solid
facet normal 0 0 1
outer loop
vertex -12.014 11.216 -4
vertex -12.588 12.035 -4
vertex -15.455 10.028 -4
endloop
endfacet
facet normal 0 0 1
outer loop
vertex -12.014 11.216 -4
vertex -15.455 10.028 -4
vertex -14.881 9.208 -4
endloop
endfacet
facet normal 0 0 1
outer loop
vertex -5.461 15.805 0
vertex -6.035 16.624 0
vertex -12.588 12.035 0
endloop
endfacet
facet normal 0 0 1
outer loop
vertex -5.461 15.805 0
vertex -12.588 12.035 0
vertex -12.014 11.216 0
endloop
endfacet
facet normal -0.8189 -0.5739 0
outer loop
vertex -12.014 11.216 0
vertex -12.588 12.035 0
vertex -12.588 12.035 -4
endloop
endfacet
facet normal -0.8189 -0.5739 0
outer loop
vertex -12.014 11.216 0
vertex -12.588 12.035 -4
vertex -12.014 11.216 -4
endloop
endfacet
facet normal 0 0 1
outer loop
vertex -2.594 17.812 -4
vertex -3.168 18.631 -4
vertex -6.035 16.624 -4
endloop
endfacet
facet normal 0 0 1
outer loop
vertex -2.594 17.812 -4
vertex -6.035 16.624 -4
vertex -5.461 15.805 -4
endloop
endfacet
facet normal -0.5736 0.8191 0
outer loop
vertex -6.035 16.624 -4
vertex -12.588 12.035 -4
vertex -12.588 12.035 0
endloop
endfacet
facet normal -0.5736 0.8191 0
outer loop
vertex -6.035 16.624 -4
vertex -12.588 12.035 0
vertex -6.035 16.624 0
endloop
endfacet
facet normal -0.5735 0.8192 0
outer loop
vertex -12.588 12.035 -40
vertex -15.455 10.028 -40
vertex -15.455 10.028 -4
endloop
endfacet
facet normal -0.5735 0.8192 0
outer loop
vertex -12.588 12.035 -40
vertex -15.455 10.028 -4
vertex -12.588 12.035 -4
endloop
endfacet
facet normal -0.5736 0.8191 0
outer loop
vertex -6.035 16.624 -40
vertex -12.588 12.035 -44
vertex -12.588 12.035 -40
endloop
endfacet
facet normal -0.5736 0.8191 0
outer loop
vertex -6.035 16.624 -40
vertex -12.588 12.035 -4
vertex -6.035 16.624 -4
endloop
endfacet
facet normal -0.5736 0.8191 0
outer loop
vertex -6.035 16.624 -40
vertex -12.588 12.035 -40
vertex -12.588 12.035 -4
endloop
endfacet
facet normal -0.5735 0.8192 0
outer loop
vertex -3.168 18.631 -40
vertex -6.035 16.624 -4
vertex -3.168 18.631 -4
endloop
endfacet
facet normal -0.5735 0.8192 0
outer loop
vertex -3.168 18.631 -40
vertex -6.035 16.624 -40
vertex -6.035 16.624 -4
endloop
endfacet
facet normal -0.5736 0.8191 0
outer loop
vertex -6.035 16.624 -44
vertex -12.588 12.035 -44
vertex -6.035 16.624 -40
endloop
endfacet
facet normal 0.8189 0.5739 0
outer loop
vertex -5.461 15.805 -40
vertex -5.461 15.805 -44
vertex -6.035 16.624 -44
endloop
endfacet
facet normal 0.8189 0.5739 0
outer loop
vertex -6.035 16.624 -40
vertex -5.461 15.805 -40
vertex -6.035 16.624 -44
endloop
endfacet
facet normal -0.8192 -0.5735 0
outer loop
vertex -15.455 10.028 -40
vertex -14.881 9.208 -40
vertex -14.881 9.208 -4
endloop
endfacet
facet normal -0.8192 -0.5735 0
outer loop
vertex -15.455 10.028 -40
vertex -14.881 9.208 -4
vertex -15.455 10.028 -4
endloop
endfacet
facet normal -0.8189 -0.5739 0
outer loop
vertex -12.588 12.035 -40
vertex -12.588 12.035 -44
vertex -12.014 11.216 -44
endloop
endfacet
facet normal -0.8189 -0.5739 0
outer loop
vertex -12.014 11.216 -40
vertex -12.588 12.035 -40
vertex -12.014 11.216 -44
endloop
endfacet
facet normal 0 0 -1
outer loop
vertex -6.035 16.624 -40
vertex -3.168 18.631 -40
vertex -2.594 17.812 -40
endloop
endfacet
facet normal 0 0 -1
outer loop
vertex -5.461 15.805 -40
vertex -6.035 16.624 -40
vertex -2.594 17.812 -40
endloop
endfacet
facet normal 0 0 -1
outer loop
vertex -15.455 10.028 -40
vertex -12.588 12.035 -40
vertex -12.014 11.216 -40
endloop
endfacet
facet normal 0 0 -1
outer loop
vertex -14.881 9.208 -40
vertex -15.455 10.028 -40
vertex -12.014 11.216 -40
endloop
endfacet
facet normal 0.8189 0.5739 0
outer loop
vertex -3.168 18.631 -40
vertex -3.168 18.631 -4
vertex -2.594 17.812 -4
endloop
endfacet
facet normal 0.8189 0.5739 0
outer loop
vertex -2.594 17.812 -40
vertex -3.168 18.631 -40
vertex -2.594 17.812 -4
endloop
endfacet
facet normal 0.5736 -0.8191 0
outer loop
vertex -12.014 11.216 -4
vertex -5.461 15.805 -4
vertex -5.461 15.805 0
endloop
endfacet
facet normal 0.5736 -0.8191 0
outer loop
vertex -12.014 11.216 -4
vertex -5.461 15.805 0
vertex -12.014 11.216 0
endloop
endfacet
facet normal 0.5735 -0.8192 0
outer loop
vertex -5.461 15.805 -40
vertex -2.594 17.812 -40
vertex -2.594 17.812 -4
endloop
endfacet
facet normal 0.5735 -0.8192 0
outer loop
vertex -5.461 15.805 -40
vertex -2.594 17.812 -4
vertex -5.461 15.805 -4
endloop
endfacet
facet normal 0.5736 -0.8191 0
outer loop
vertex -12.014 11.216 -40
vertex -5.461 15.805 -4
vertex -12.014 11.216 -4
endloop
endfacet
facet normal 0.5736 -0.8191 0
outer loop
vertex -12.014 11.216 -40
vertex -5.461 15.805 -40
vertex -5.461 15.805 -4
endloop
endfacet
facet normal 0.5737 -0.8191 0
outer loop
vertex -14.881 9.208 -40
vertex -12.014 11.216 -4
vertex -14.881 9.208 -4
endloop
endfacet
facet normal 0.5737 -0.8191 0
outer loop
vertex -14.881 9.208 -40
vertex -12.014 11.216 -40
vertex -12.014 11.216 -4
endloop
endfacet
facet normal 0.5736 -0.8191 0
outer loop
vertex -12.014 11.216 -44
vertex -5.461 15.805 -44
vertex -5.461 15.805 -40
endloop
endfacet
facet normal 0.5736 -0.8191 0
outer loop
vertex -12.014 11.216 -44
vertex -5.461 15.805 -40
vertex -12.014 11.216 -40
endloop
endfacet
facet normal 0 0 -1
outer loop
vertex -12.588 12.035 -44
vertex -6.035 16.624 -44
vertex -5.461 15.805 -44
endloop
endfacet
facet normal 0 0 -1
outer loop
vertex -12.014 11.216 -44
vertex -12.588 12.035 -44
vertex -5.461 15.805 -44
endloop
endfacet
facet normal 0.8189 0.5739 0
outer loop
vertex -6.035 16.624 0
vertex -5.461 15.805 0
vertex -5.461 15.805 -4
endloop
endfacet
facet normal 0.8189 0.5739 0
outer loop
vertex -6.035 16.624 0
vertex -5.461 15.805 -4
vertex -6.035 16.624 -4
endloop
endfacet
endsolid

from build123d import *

# Parameters (mm, degrees)
PAD008_DEPTH               = 22
POCKET008_DEPTH            = 4
BODY004023_PLACEMENT_ANGLE = 90


with BuildPart() as part:
    # Sketch014 → Pad008 (new body)
    with BuildSketch(Plane.XY):
        Polygon((9.2084513411, 14.8813448283), (10.0276033854, 15.4549212646), (18.6312499306, 3.1676406003), (17.8120978864, 2.594064164), align=None)
    pad008 = extrude(amount=-PAD008_DEPTH)

    # Mirrored: Pad008 across face of Pad008
    add(pad008.mirror(Plane(origin=(13.9198506359, 9.0244927143, -22), x_dir=(1, 0, 0), z_dir=(0, 0, -1))))

    # Sketch027 → Pocket008 (cut)
    with BuildSketch(Plane.XY):
        Polygon((9.2084513411, 14.8813448283), (10.0276033854, 15.4549212646), (12.0351209126, 12.5878891096), (11.2159688683, 12.0143126733), align=None)
        Polygon((18.6312499306, 3.1676406003), (17.8120978864, 2.594064164), (15.8045803591, 5.461096319), (16.6237324034, 6.0346727553), align=None)
    pocket008 = extrude(amount=-POCKET008_DEPTH, mode=Mode.SUBTRACT)

    # Mirrored001: Pocket008 across face of Pad008
    add(pocket008.mirror(Plane(origin=(13.9198506359, 9.0244927143, -22), x_dir=(1, 0, 0), z_dir=(0, 0, -1))), mode=Mode.SUBTRACT)


with BuildPart() as part_1:
    # Body004023 placement: moved
    add(part.part.rotate(Axis((0, 0, 0), (0, 0, 1)), BODY004023_PLACEMENT_ANGLE))


solid = part_1.part
